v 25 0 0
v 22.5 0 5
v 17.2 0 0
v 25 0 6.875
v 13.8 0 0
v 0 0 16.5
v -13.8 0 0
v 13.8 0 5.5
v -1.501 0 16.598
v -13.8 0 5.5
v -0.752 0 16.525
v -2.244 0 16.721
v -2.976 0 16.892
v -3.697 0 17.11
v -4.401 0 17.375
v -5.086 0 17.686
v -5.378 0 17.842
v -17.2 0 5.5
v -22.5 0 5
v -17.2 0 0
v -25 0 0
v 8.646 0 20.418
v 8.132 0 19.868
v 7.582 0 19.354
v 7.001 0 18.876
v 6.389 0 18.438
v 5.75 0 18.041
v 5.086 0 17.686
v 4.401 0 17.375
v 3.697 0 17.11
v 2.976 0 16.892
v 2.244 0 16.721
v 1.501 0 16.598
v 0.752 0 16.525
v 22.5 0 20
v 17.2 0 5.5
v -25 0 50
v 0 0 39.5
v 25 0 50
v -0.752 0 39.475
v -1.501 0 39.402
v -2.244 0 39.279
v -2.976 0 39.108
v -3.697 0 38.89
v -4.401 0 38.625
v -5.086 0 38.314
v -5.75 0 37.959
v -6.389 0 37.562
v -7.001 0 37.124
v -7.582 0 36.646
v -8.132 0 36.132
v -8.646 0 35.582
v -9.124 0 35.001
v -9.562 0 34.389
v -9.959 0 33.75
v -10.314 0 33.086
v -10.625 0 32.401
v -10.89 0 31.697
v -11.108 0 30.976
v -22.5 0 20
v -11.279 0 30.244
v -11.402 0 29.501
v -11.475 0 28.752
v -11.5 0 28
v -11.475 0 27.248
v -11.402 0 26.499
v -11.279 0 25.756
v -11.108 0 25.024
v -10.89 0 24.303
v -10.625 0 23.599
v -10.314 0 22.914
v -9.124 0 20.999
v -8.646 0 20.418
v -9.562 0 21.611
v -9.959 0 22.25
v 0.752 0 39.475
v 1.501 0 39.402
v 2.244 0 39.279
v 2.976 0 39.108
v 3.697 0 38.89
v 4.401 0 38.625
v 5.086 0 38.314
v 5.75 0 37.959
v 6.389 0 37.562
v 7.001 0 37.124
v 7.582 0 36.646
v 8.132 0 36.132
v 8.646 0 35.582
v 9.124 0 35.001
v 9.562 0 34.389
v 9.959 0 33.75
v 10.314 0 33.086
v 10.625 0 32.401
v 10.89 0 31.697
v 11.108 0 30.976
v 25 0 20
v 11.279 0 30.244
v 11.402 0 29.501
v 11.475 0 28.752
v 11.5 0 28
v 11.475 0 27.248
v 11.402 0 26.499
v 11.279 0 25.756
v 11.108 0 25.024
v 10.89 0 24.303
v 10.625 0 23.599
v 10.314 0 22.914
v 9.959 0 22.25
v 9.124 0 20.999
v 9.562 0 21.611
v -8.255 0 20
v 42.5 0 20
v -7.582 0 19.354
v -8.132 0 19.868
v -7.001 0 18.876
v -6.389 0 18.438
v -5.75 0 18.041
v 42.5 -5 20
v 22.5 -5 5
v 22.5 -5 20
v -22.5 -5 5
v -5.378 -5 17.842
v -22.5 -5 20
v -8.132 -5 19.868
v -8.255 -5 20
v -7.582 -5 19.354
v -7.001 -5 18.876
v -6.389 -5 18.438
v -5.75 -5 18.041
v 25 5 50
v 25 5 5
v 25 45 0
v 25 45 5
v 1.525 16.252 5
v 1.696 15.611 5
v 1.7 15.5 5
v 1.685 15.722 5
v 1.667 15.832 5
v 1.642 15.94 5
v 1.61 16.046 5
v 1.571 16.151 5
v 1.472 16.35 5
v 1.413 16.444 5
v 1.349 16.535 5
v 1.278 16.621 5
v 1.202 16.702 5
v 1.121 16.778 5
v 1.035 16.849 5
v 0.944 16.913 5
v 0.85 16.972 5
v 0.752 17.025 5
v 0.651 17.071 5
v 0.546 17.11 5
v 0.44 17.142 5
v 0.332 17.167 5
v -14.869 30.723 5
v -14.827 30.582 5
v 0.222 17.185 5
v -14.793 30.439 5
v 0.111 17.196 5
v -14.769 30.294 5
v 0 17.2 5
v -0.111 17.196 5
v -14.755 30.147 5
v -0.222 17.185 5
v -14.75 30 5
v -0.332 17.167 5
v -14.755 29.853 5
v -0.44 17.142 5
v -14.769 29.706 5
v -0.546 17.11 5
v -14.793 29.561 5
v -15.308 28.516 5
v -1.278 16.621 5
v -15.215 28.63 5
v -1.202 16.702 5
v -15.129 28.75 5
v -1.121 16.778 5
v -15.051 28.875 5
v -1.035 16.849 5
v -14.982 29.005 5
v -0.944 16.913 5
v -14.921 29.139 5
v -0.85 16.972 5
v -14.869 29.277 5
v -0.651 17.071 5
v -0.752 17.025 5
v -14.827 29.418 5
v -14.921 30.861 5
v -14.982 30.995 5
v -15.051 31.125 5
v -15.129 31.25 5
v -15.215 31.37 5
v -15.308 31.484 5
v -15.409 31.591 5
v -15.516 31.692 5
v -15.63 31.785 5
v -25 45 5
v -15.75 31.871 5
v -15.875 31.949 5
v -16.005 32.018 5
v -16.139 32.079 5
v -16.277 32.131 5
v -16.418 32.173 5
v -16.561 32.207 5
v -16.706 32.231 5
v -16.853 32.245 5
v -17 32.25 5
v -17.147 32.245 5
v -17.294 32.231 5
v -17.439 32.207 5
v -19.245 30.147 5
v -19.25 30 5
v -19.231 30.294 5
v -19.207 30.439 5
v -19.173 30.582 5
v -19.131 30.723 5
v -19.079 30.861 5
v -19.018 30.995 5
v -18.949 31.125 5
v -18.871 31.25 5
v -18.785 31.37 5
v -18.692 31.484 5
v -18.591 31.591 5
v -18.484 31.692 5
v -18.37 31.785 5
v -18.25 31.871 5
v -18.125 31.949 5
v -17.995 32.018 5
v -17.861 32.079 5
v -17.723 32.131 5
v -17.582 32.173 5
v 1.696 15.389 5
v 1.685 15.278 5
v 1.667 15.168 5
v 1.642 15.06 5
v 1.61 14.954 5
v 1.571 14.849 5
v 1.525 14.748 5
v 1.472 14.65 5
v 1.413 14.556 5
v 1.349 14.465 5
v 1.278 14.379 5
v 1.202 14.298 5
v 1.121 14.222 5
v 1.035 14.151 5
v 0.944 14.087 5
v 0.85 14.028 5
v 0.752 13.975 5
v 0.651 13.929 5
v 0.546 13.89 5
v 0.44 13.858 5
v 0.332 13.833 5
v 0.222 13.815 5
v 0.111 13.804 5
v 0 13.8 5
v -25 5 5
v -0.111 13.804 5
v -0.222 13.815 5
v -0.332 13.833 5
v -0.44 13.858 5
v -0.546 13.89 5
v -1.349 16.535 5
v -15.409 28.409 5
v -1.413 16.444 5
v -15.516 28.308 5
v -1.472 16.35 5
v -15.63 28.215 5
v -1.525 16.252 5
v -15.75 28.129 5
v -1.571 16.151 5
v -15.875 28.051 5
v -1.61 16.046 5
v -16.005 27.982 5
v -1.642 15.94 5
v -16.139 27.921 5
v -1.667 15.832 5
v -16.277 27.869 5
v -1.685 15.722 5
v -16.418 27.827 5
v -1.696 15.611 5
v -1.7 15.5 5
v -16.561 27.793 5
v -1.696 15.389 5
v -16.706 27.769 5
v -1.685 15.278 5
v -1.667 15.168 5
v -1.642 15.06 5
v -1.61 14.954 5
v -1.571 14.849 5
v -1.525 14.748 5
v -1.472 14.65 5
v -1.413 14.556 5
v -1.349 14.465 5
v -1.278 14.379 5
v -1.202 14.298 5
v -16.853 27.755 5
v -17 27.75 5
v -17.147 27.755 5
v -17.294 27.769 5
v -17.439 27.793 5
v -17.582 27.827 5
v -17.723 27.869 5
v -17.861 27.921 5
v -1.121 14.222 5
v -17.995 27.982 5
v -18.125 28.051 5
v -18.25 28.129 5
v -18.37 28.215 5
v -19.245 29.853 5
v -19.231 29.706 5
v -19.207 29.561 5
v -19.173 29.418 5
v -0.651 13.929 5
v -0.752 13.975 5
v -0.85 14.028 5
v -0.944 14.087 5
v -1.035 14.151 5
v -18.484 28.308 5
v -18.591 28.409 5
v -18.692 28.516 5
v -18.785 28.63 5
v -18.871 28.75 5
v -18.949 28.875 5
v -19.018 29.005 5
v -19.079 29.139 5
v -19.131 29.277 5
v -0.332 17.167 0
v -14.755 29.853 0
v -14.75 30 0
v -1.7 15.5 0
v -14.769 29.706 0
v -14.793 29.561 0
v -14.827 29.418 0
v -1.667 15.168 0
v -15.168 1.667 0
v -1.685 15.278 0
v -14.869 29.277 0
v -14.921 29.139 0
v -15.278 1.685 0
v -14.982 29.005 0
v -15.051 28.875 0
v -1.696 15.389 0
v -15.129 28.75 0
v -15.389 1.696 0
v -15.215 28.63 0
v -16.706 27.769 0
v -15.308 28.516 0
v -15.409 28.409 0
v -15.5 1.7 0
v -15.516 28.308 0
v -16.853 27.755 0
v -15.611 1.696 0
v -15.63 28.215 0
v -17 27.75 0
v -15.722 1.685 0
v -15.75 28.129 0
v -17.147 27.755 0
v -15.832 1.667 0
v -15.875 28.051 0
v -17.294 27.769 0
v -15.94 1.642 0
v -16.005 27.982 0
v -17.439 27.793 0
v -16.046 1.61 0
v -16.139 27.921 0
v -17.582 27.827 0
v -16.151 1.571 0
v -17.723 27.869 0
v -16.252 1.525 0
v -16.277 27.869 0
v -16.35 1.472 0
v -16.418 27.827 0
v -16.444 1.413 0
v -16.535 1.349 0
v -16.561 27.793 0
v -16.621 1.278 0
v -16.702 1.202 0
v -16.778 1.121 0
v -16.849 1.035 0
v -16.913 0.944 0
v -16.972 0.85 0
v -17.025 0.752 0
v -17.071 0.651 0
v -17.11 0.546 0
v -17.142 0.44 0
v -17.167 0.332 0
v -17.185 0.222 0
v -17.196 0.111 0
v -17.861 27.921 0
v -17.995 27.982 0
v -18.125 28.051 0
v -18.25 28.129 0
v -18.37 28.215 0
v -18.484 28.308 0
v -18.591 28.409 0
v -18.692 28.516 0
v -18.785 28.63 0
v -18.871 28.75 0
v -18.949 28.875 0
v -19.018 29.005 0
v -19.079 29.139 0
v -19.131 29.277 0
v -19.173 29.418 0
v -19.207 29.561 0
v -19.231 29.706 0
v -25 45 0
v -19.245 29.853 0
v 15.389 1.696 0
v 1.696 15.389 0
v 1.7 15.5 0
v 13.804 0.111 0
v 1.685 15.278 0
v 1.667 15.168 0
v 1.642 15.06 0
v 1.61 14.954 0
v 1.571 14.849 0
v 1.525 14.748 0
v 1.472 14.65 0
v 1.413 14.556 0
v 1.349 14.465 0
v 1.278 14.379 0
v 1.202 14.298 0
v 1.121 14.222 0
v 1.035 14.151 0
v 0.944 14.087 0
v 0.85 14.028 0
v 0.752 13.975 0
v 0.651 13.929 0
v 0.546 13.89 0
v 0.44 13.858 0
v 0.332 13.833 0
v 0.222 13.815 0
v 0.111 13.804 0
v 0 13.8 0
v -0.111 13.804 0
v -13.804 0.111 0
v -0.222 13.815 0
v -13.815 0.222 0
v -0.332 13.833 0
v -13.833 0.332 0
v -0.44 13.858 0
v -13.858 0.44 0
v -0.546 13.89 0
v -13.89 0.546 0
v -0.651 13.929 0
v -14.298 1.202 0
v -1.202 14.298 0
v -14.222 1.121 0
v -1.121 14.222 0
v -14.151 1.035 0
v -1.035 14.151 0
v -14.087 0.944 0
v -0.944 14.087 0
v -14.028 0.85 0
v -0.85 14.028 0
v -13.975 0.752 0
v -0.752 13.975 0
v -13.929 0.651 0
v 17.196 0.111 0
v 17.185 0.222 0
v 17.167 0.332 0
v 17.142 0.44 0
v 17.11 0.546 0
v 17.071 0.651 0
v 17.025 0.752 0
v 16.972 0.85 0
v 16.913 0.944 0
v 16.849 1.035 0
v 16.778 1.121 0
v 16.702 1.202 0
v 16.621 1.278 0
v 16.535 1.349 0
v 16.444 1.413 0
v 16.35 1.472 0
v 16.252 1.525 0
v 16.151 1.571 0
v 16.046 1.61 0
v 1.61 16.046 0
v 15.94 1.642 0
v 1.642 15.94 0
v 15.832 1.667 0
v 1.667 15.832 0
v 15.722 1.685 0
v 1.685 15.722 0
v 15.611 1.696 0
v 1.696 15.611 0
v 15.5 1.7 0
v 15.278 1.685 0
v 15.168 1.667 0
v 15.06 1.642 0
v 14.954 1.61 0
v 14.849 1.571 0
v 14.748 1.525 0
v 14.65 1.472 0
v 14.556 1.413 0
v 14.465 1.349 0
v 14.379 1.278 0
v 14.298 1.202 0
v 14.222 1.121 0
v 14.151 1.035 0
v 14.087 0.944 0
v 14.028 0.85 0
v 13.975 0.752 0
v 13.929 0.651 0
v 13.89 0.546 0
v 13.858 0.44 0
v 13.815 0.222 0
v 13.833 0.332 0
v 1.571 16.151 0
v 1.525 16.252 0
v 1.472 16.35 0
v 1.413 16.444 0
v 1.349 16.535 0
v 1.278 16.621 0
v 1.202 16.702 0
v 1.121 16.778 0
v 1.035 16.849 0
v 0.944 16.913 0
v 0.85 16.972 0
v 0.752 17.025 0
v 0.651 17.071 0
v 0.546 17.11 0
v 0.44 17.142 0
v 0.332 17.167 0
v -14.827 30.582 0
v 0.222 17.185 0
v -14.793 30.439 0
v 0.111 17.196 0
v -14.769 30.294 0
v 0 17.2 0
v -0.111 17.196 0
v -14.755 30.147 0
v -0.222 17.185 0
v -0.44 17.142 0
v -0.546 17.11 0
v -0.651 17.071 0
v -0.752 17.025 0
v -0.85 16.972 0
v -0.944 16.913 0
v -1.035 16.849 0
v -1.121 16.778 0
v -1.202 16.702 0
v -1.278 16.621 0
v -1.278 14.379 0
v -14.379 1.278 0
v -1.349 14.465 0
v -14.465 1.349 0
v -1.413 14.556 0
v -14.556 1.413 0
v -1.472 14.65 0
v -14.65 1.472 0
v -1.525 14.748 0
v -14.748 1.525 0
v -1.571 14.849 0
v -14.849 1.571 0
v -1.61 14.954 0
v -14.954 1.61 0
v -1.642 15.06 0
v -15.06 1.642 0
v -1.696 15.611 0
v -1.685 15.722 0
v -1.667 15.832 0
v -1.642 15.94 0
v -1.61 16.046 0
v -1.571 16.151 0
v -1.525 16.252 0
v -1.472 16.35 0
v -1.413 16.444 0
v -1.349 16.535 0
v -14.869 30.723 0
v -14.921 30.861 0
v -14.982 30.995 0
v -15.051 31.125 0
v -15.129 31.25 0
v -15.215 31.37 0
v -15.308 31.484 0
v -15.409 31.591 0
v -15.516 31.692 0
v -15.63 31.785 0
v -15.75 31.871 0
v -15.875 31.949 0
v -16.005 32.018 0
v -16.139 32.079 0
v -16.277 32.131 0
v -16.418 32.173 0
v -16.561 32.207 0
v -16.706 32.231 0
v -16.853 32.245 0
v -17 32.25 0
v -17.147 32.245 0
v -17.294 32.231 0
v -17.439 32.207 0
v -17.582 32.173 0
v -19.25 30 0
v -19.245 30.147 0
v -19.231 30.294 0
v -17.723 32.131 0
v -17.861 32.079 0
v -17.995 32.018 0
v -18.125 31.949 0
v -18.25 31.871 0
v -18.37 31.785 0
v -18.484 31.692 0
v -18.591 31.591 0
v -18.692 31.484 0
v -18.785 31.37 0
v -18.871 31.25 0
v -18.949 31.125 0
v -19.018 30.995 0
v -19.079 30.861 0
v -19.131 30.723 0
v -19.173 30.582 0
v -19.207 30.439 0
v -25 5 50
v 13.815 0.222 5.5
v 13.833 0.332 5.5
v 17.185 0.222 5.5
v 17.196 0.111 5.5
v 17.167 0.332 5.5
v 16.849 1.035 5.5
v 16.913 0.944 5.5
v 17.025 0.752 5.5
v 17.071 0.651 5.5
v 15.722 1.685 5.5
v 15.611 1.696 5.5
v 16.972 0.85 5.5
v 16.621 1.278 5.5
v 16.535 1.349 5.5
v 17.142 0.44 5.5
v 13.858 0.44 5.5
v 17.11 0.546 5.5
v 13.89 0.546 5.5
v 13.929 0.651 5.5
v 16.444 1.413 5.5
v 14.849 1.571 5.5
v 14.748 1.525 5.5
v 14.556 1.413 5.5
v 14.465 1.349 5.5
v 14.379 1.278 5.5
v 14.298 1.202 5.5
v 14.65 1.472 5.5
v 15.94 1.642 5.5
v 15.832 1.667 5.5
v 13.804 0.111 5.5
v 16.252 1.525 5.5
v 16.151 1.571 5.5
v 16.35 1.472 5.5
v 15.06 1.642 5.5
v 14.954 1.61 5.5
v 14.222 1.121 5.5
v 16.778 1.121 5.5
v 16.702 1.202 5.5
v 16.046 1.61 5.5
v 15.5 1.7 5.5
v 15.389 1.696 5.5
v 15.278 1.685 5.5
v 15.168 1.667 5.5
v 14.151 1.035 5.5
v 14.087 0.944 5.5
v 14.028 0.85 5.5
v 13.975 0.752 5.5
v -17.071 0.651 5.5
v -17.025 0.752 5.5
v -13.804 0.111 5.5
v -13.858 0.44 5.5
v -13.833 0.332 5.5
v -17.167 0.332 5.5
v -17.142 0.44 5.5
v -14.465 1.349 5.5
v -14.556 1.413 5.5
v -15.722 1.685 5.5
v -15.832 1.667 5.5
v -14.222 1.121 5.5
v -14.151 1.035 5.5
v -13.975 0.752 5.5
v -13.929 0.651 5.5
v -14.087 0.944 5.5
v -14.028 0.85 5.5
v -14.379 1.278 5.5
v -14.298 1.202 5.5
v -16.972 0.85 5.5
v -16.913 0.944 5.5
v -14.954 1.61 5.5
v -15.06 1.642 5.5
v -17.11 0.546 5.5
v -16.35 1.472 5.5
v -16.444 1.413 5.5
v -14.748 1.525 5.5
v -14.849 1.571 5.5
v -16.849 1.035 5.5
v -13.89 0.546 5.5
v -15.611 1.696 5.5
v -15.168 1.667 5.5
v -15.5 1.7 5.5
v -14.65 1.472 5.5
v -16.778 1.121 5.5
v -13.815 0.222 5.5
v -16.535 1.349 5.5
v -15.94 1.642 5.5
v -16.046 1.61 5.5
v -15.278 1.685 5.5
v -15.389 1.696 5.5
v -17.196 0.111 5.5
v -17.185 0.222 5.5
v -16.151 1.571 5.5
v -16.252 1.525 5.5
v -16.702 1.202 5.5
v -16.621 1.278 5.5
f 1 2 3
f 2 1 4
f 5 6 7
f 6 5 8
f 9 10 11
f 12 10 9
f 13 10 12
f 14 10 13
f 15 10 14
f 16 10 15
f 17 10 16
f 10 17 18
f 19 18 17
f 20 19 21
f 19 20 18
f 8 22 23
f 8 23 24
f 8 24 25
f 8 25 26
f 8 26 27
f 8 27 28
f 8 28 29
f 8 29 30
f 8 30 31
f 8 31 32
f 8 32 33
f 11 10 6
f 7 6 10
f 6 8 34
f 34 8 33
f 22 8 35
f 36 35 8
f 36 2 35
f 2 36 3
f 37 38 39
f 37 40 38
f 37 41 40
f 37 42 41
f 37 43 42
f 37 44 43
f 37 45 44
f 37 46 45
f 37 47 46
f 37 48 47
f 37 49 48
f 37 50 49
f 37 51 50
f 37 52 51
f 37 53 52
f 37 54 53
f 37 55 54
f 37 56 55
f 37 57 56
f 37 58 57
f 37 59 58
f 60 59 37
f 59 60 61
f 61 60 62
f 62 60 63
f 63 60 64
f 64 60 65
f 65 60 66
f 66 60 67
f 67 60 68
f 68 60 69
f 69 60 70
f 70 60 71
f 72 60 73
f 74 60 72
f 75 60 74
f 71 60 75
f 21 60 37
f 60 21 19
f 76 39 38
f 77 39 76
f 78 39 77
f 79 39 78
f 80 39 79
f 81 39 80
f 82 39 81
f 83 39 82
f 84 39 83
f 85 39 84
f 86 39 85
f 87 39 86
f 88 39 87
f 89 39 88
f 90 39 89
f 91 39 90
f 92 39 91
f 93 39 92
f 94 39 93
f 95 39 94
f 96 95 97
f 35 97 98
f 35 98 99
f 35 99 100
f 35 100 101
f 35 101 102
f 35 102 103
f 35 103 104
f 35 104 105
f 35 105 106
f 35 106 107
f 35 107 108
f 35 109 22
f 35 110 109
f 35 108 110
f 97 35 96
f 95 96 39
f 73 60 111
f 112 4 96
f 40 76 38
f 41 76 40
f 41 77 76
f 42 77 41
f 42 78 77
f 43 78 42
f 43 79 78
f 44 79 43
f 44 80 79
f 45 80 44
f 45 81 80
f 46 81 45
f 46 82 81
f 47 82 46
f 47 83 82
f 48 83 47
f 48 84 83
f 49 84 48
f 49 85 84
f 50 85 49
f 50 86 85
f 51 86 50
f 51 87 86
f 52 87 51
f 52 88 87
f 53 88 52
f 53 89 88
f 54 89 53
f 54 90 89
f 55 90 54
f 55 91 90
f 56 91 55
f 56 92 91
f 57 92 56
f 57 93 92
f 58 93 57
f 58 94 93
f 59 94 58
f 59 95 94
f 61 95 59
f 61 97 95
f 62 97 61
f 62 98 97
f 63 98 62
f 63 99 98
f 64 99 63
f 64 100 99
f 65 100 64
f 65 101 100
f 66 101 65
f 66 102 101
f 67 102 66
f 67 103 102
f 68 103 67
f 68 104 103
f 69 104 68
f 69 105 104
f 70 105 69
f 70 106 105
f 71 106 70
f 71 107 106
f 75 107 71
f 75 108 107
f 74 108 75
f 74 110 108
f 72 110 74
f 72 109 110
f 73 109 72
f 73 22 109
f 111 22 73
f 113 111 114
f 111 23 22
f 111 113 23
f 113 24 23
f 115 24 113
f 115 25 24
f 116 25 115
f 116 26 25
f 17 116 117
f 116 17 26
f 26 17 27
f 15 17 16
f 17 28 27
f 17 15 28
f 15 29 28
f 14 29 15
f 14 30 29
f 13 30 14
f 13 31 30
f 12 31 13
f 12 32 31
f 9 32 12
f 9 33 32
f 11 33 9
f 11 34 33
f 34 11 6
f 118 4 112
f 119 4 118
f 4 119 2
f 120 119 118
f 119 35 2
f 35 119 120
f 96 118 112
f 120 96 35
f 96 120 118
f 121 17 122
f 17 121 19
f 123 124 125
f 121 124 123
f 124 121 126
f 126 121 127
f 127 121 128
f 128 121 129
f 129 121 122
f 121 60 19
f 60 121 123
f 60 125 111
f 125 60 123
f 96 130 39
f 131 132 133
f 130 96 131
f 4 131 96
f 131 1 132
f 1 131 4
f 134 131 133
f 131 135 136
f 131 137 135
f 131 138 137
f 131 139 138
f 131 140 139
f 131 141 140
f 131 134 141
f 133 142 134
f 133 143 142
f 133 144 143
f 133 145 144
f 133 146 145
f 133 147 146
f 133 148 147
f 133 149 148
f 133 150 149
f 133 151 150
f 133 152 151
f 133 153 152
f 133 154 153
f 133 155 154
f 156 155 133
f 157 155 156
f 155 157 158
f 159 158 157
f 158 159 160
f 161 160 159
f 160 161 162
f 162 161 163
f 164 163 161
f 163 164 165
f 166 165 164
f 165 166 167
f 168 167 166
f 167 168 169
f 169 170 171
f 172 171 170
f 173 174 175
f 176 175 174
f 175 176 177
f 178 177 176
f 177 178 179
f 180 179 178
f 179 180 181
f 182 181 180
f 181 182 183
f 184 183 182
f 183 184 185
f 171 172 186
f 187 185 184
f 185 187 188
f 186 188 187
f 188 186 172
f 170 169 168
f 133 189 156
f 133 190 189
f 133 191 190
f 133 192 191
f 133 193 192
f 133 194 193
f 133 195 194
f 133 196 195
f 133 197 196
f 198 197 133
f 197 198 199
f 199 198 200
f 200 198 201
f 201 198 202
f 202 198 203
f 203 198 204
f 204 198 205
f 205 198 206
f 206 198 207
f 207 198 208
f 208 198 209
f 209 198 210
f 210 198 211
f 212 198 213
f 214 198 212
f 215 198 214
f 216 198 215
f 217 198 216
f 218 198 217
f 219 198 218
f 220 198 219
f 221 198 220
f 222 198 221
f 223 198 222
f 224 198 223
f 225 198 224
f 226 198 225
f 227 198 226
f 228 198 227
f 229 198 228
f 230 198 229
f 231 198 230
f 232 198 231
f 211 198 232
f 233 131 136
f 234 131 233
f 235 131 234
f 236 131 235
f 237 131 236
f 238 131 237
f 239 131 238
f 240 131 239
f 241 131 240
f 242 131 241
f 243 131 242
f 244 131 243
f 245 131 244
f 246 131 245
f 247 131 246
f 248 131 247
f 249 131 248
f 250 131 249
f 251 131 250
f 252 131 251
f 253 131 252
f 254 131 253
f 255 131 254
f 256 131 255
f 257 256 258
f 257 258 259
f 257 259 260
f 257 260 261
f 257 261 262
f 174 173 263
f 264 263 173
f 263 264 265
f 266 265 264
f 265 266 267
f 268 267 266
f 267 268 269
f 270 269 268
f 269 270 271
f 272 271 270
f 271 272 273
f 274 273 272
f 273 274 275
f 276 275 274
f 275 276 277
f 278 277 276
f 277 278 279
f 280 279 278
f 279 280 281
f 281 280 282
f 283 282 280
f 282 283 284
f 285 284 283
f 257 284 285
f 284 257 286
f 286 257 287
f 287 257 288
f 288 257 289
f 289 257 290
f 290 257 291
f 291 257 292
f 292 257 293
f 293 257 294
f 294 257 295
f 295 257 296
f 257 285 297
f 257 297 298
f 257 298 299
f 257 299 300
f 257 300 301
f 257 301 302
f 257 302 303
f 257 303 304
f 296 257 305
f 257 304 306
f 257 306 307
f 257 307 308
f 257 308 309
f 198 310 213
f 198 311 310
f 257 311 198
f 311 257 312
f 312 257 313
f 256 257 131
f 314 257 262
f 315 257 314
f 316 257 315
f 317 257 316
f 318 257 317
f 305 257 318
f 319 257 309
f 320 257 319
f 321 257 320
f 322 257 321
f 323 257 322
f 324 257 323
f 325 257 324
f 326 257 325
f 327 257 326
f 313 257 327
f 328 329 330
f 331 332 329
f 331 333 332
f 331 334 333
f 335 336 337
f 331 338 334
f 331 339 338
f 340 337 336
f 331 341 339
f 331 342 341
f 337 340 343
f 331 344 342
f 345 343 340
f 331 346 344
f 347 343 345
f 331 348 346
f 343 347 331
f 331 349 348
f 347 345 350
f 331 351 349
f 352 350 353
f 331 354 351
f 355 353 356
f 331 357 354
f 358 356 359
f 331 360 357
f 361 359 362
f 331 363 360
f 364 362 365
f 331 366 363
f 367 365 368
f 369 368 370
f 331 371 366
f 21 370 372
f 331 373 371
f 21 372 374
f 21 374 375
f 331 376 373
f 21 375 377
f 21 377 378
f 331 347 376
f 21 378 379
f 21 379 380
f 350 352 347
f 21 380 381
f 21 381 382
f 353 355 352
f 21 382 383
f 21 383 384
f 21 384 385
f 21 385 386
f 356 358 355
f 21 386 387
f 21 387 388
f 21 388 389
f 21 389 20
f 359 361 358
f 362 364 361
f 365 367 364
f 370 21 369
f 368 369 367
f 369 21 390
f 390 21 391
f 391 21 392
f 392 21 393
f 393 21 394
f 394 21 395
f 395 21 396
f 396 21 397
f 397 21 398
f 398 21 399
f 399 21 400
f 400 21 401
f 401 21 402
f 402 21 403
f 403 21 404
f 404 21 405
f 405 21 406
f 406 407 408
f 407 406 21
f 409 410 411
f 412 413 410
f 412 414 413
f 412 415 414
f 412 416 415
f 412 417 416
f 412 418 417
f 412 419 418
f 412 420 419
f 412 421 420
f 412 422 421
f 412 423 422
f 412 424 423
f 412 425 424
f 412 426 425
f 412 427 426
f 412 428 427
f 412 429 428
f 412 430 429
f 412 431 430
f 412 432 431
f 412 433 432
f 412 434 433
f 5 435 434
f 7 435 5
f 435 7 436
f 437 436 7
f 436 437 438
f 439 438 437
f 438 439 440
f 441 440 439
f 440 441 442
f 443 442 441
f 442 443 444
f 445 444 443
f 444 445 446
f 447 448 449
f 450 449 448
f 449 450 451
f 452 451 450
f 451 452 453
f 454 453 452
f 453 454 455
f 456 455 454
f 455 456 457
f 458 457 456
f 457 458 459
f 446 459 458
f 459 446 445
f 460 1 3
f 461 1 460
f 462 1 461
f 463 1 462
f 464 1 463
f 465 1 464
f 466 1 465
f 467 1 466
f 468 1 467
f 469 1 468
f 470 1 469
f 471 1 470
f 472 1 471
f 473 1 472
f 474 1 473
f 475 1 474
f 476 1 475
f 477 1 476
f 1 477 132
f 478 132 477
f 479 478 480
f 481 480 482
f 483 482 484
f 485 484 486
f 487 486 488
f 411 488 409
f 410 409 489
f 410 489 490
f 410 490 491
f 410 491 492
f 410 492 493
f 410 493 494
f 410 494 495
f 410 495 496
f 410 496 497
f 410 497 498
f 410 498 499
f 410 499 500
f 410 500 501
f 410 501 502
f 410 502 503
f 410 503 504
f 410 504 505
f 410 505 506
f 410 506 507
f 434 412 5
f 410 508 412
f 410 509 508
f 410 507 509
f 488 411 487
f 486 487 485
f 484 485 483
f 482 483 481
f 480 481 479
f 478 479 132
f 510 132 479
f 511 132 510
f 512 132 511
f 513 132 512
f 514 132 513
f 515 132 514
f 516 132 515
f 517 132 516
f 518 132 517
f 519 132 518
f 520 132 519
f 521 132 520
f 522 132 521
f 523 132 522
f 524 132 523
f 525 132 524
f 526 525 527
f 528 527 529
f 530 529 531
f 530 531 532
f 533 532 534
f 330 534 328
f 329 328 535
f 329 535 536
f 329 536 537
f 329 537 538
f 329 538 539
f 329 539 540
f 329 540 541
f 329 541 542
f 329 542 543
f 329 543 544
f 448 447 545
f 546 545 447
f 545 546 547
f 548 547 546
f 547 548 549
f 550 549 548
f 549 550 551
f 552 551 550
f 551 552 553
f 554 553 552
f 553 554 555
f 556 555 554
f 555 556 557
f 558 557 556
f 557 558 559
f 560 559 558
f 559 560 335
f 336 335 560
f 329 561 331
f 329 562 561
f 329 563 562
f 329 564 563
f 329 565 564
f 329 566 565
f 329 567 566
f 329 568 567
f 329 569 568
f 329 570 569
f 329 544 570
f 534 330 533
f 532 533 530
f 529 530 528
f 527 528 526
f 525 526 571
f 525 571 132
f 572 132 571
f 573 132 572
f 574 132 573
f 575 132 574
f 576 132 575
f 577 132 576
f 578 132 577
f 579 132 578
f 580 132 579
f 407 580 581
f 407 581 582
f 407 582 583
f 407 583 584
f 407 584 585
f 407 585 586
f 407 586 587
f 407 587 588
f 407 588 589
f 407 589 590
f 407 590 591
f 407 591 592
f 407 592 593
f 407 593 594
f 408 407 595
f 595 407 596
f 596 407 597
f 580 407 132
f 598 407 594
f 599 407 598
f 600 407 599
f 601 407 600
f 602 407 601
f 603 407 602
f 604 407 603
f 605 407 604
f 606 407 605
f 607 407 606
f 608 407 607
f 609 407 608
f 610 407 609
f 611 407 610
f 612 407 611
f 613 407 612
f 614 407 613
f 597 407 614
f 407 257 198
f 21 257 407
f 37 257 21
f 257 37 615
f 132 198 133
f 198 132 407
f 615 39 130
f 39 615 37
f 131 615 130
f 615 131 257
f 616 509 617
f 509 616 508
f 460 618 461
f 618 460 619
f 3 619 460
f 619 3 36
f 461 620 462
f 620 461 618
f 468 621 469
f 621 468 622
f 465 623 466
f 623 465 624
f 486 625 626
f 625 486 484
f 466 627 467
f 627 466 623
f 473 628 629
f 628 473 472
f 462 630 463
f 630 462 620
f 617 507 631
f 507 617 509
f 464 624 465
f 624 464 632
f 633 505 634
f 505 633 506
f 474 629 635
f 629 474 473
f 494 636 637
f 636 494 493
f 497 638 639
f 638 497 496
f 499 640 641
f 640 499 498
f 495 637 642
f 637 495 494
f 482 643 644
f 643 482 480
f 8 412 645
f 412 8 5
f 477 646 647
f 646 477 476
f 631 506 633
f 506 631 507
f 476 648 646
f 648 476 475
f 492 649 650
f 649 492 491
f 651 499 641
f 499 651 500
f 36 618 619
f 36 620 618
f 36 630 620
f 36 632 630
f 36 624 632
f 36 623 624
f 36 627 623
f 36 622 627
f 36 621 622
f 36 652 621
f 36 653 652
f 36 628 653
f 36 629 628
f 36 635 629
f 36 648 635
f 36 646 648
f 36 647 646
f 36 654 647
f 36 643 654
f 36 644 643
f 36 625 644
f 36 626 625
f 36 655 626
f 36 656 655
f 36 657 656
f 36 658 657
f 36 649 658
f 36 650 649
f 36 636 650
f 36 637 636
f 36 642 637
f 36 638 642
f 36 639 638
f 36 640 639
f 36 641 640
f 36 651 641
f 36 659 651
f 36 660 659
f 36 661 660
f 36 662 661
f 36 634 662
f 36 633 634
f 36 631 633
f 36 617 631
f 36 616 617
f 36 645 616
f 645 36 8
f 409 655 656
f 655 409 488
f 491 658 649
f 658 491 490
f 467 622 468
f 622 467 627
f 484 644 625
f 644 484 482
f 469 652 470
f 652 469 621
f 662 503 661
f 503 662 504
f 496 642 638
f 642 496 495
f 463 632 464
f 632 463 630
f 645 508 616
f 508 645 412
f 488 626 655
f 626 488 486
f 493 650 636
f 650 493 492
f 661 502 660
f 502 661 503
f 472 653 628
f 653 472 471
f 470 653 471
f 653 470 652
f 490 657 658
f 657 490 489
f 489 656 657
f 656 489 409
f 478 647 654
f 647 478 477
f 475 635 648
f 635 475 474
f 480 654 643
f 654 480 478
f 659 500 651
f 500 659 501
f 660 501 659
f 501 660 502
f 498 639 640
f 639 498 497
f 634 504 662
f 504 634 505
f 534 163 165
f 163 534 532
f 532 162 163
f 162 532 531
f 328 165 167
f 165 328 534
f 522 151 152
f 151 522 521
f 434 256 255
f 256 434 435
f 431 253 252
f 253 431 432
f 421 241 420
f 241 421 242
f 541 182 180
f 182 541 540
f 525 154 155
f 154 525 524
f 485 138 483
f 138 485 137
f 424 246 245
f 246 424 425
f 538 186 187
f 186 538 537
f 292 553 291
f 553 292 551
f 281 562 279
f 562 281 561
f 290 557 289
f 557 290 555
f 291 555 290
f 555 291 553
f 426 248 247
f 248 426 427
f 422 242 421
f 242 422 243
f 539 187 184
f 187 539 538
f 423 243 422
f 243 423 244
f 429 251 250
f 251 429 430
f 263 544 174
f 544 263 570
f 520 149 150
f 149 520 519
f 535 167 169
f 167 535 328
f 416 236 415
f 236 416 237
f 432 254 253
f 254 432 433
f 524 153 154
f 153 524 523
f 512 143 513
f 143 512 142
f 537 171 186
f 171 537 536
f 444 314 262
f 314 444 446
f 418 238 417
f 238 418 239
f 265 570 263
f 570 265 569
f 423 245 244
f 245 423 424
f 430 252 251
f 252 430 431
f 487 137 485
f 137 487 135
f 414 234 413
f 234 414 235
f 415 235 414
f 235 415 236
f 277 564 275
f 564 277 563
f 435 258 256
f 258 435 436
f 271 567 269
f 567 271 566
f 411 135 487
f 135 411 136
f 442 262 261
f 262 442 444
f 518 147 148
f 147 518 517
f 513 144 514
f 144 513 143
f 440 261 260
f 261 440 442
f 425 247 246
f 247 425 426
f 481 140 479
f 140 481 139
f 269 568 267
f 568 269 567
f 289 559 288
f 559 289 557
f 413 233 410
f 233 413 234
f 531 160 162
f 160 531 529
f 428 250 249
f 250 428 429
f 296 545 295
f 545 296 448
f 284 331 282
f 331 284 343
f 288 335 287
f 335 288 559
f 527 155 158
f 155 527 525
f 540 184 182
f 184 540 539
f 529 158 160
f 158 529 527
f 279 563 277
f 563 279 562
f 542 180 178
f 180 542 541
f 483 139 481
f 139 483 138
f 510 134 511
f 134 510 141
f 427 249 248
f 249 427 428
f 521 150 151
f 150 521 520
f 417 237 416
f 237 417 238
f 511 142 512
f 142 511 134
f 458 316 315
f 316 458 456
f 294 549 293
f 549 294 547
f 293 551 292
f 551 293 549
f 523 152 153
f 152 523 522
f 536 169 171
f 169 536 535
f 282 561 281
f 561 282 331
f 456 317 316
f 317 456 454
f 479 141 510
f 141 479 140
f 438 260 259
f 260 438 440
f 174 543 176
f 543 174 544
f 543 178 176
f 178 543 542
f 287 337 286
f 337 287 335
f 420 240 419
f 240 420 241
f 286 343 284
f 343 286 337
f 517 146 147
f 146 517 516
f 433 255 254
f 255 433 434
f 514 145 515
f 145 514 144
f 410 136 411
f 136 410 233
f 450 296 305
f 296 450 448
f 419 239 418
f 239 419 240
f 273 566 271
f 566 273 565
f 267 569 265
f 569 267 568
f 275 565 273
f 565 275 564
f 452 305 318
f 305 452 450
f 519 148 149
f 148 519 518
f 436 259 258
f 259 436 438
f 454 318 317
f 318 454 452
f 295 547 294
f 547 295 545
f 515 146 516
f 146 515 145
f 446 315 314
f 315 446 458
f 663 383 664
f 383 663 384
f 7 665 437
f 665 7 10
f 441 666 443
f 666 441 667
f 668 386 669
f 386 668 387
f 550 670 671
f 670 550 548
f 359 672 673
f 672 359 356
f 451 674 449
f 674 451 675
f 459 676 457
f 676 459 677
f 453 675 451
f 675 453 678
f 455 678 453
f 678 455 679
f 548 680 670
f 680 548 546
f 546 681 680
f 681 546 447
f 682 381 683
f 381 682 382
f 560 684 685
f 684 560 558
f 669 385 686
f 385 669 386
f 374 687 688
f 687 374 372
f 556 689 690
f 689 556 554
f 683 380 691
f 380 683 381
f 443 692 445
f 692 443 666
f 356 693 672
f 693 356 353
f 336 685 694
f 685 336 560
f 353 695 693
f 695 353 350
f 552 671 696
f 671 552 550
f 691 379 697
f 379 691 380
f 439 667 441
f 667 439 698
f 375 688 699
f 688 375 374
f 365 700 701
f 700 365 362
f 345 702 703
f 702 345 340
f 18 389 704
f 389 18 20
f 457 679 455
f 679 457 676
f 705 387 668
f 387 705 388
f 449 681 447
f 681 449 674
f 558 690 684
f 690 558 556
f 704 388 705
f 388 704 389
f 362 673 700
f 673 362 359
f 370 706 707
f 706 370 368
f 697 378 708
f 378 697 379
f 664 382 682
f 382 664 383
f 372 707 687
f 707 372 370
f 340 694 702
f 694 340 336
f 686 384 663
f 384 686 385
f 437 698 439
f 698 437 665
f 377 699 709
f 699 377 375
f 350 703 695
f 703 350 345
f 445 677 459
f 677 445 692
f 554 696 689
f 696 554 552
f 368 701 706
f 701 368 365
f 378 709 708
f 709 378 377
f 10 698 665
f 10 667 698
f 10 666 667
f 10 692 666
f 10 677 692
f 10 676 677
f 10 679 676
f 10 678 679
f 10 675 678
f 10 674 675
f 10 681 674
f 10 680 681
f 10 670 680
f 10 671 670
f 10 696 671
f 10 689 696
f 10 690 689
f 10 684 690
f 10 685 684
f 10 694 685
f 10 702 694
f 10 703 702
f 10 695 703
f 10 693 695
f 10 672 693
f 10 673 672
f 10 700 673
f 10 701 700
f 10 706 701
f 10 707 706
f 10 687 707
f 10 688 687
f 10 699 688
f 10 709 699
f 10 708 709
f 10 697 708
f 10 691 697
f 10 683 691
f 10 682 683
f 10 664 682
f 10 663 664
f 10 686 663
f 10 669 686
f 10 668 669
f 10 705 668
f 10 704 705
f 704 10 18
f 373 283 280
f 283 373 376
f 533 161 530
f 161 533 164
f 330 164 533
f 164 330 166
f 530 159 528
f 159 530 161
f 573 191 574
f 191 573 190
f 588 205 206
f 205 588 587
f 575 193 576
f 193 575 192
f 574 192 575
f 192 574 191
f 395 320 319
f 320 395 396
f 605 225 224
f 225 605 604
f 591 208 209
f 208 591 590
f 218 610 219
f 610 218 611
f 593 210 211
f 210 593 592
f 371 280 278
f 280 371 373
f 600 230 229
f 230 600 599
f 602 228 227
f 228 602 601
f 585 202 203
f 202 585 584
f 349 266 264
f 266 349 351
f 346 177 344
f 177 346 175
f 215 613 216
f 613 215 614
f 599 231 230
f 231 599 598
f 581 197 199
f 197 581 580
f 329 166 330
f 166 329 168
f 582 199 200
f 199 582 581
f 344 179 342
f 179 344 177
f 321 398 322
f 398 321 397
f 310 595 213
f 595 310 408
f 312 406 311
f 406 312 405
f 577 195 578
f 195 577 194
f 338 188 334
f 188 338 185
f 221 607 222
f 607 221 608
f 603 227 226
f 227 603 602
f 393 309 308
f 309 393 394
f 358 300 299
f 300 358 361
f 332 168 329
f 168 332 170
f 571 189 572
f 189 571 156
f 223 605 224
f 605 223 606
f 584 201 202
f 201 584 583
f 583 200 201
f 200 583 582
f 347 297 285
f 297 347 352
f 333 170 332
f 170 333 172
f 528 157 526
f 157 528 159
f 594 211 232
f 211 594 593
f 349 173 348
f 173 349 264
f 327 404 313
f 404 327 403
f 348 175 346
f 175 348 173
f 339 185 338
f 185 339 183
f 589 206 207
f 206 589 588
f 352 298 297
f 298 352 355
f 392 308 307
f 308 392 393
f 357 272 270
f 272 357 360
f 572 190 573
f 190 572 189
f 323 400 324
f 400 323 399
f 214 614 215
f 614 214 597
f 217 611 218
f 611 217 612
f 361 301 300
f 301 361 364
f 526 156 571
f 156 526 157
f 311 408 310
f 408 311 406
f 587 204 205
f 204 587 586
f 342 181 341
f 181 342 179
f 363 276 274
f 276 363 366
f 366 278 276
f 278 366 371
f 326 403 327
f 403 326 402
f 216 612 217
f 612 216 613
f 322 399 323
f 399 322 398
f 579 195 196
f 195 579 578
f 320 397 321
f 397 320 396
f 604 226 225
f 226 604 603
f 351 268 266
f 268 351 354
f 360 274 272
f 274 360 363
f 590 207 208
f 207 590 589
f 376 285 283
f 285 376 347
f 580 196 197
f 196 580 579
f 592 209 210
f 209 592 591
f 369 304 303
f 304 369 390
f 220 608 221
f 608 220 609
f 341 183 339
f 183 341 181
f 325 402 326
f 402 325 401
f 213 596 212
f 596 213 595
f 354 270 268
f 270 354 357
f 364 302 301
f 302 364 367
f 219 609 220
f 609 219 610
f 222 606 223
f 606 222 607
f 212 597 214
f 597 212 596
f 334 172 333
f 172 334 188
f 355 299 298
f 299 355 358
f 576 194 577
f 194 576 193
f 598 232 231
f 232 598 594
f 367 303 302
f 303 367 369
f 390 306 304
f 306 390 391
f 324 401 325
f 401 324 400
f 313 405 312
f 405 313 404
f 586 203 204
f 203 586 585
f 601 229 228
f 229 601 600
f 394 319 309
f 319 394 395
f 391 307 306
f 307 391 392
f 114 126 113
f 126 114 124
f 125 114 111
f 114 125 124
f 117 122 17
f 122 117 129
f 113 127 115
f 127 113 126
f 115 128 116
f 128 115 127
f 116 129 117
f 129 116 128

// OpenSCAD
// L-shaped mounting bracket for NEMA 17 stepper motor
// Print orientation: base plate on bed (z = 0), motor plate builds upward (+Z)

// ---------- Parameters ----------
base_x0      = -25;    // base plate x start
base_x1      = 25;     // base plate x end
base_y0      = 0;      // base plate y start
base_y1      = 45;     // base plate y end
base_z1      = 5;      // base plate thickness (z)

motor_x0     = -25;    // motor plate x start
motor_x1     = 25;     // motor plate x end
motor_y0     = 0;      // motor plate y start
motor_y1     = 5;      // motor plate y end (thickness)
motor_z1     = 50;     // motor plate height (z)

hole_m4_x    = -17;    // M4 through-hole x position
hole_m4_y    = 30;     // M4 through-hole y position
hole_m4_d    = 4.5;    // M4 hole diameter

boss_d       = 23;     // motor centring boss hole diameter
boss_x       = 0;      // boss hole centre x
boss_z       = 28;     // boss hole centre z

screw_d      = 3.4;    // M3 screw hole diameter
screw_pat    = 31;     // screw hole square pattern size
screw_count  = 4;      // number of screw holes

gusset_t     = 5;      // triangular gusset thickness (x)
gusset_y     = 20;     // gusset leg along +Y
gusset_z     = 20;     // gusset leg along +Z

eps          = 0.5;    // cutter overshoot past faces

$fn = 96;              // curve resolution

// ---------- Model ----------
difference() {
    union() {
        // Base plate
        translate([base_x0, base_y0, 0])
            cube([base_x1 - base_x0, base_y1 - base_y0, base_z1]);

        // Vertical motor plate
        translate([motor_x0, motor_y0, 0])
            cube([motor_x1 - motor_x0, motor_y1 - motor_y0, motor_z1]);

        // Left gusset (x = -25 to -20), right gusset (x = 20 to 25)
        for (sx = [-1, 1])
            translate([sx * (motor_x0 + gusset_t / 2), 0, 0])
                rotate([90, 0, 0])
                    linear_extrude(height = gusset_t)
                        polygon(points = [
                            [0, 5],
                            [0, gusset_y],
                            [gusset_z, gusset_y]
                        ]);
    }

    // M4 through-hole in base plate
    translate([hole_m4_x, hole_m4_y, -eps])
        cylinder(d = hole_m4_d, h = base_z1 + 2 * eps);

    // Boss hole through motor plate (along Y)
    translate([boss_x, 0, boss_z])
        rotate([90, 0, 0])
            cylinder(d = boss_d, h = motor_y1 - motor_y0 + 2 * eps);

    // M3 screw holes on square pattern, centred on boss hole
    for (a = [0 : 90 : 270])
        rotate([0, 0, a])
            translate([screw_pat / 2, 0, -eps])
                cylinder(d = screw_d, h = motor_y1 - motor_y0 + 2 * eps);
}
